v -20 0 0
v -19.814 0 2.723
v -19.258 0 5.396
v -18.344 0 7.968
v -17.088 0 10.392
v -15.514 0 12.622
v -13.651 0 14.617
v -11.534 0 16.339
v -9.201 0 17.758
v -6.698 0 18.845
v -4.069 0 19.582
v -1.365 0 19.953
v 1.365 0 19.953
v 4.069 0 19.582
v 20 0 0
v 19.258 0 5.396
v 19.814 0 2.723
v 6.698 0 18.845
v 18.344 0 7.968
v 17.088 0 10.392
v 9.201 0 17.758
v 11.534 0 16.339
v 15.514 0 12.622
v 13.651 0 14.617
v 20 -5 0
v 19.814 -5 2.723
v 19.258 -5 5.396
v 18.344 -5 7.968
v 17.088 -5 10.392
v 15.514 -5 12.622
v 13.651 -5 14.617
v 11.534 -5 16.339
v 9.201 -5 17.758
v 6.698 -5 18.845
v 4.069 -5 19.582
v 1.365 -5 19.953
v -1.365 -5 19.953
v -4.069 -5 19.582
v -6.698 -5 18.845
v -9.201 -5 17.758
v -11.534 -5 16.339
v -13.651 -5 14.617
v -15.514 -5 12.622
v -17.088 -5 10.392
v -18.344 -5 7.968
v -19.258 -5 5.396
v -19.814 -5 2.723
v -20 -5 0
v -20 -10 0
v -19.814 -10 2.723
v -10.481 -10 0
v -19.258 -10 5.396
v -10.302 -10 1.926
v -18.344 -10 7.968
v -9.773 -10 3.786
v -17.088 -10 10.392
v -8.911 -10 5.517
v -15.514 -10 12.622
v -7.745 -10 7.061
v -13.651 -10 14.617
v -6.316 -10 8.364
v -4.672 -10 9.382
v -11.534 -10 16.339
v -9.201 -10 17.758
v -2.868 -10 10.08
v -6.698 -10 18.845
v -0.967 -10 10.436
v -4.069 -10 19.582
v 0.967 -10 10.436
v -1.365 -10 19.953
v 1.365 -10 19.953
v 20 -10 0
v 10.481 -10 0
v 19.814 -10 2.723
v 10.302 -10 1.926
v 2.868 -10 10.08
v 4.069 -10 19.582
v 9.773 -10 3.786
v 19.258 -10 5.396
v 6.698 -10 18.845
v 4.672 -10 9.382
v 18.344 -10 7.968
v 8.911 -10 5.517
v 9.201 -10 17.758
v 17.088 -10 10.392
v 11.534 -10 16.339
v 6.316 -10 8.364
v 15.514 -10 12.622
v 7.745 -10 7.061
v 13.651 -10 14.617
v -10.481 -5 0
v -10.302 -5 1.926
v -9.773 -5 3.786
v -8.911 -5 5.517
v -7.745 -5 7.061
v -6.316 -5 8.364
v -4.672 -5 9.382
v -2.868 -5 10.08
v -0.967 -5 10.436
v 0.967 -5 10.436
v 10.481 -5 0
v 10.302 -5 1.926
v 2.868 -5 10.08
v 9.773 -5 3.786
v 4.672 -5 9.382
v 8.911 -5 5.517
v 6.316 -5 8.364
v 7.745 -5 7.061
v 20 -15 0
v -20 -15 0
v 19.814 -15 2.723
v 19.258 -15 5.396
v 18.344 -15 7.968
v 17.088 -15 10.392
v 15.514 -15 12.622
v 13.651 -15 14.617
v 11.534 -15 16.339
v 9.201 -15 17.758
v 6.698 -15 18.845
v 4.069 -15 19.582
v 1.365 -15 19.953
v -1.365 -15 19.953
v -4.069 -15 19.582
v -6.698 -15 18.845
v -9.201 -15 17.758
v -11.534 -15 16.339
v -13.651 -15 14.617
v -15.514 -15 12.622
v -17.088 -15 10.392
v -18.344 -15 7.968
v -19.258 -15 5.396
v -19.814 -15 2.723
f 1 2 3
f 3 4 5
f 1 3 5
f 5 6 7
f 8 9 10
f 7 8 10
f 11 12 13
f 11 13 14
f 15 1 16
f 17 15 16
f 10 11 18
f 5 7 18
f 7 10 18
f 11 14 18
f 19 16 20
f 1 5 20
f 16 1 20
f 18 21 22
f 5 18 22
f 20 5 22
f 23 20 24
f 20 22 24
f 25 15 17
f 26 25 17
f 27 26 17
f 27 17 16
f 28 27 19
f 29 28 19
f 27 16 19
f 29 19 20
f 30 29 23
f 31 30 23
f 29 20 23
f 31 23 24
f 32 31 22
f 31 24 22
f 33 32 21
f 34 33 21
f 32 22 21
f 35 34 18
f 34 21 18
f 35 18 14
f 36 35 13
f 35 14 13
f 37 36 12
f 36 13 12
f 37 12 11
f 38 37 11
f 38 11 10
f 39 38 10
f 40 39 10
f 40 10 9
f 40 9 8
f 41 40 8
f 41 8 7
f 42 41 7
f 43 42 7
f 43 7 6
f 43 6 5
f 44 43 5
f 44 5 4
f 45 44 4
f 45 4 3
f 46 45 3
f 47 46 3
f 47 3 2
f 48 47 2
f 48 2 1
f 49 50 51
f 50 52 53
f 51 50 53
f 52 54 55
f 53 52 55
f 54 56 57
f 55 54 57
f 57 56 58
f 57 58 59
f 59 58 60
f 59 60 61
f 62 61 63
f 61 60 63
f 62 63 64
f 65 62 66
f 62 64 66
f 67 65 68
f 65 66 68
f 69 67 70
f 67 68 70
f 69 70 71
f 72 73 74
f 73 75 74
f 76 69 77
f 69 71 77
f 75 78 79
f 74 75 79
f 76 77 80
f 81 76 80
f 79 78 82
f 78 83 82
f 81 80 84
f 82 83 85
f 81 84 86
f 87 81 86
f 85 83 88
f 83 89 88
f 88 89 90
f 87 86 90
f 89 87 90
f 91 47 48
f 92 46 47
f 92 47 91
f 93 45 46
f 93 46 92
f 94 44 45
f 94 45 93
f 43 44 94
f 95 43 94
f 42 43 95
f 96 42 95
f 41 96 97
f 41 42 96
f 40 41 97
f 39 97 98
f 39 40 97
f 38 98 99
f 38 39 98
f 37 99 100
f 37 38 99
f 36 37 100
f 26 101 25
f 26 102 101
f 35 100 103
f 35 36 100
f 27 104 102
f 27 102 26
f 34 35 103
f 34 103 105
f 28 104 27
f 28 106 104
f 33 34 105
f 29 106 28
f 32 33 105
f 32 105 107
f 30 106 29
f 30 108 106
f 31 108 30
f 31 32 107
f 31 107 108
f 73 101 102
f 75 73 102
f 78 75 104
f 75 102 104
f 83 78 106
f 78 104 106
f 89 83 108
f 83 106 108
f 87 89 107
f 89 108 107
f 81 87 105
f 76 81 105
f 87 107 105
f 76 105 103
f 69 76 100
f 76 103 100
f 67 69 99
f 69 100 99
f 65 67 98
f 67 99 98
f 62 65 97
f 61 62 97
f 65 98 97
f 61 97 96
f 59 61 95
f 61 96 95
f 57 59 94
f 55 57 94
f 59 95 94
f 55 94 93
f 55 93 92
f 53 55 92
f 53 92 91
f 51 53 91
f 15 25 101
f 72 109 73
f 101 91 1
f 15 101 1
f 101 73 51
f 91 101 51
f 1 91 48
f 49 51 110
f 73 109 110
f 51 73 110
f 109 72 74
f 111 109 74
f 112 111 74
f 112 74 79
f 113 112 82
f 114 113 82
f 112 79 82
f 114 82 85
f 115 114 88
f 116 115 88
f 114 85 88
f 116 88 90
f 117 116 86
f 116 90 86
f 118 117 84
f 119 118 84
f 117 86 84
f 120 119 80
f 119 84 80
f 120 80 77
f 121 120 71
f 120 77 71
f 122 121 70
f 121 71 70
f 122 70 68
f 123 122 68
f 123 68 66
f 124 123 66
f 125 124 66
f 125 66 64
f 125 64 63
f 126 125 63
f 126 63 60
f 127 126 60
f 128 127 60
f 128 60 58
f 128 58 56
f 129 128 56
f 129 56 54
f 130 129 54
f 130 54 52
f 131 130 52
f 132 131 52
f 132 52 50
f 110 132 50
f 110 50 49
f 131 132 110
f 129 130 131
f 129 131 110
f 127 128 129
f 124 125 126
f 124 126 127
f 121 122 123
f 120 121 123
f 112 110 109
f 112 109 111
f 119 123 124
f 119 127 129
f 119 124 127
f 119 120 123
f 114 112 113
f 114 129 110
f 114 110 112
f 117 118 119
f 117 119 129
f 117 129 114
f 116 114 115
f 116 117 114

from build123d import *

# Parameters (mm, degrees)
F0_R     = 20
F1_DEPTH = 5
F2_R     = 10.480538
F3_DEPTH = 5
F4_R     = 20
F5_DEPTH = 5
F7_DEPTH = 25


with BuildPart() as f1:
    # F0 (on Front) → F1 (new body)
    with BuildSketch(Plane.XZ):
        Circle(F0_R)
    extrude(amount=F1_DEPTH)

    # F2 (on face) → F3 (join)
    with BuildSketch(Plane.XZ.offset(5)):
        Circle(F2_R)
    extrude(amount=F3_DEPTH)

    # F4 (on face) → F5 (join)
    with BuildSketch(Plane.XZ.offset(10)):
        Circle(F4_R)
    extrude(amount=F5_DEPTH)

    # F6 (on face) → F7 (cut)
    with BuildSketch(Plane.XZ.offset(15)):
        Polygon((42.726062, 0), (-35.465427, 0), (-28.7633, -32.393619), (42.726062, -32.393619), align=None)
    extrude(amount=-F7_DEPTH, mode=Mode.SUBTRACT)


solid = f1.part
